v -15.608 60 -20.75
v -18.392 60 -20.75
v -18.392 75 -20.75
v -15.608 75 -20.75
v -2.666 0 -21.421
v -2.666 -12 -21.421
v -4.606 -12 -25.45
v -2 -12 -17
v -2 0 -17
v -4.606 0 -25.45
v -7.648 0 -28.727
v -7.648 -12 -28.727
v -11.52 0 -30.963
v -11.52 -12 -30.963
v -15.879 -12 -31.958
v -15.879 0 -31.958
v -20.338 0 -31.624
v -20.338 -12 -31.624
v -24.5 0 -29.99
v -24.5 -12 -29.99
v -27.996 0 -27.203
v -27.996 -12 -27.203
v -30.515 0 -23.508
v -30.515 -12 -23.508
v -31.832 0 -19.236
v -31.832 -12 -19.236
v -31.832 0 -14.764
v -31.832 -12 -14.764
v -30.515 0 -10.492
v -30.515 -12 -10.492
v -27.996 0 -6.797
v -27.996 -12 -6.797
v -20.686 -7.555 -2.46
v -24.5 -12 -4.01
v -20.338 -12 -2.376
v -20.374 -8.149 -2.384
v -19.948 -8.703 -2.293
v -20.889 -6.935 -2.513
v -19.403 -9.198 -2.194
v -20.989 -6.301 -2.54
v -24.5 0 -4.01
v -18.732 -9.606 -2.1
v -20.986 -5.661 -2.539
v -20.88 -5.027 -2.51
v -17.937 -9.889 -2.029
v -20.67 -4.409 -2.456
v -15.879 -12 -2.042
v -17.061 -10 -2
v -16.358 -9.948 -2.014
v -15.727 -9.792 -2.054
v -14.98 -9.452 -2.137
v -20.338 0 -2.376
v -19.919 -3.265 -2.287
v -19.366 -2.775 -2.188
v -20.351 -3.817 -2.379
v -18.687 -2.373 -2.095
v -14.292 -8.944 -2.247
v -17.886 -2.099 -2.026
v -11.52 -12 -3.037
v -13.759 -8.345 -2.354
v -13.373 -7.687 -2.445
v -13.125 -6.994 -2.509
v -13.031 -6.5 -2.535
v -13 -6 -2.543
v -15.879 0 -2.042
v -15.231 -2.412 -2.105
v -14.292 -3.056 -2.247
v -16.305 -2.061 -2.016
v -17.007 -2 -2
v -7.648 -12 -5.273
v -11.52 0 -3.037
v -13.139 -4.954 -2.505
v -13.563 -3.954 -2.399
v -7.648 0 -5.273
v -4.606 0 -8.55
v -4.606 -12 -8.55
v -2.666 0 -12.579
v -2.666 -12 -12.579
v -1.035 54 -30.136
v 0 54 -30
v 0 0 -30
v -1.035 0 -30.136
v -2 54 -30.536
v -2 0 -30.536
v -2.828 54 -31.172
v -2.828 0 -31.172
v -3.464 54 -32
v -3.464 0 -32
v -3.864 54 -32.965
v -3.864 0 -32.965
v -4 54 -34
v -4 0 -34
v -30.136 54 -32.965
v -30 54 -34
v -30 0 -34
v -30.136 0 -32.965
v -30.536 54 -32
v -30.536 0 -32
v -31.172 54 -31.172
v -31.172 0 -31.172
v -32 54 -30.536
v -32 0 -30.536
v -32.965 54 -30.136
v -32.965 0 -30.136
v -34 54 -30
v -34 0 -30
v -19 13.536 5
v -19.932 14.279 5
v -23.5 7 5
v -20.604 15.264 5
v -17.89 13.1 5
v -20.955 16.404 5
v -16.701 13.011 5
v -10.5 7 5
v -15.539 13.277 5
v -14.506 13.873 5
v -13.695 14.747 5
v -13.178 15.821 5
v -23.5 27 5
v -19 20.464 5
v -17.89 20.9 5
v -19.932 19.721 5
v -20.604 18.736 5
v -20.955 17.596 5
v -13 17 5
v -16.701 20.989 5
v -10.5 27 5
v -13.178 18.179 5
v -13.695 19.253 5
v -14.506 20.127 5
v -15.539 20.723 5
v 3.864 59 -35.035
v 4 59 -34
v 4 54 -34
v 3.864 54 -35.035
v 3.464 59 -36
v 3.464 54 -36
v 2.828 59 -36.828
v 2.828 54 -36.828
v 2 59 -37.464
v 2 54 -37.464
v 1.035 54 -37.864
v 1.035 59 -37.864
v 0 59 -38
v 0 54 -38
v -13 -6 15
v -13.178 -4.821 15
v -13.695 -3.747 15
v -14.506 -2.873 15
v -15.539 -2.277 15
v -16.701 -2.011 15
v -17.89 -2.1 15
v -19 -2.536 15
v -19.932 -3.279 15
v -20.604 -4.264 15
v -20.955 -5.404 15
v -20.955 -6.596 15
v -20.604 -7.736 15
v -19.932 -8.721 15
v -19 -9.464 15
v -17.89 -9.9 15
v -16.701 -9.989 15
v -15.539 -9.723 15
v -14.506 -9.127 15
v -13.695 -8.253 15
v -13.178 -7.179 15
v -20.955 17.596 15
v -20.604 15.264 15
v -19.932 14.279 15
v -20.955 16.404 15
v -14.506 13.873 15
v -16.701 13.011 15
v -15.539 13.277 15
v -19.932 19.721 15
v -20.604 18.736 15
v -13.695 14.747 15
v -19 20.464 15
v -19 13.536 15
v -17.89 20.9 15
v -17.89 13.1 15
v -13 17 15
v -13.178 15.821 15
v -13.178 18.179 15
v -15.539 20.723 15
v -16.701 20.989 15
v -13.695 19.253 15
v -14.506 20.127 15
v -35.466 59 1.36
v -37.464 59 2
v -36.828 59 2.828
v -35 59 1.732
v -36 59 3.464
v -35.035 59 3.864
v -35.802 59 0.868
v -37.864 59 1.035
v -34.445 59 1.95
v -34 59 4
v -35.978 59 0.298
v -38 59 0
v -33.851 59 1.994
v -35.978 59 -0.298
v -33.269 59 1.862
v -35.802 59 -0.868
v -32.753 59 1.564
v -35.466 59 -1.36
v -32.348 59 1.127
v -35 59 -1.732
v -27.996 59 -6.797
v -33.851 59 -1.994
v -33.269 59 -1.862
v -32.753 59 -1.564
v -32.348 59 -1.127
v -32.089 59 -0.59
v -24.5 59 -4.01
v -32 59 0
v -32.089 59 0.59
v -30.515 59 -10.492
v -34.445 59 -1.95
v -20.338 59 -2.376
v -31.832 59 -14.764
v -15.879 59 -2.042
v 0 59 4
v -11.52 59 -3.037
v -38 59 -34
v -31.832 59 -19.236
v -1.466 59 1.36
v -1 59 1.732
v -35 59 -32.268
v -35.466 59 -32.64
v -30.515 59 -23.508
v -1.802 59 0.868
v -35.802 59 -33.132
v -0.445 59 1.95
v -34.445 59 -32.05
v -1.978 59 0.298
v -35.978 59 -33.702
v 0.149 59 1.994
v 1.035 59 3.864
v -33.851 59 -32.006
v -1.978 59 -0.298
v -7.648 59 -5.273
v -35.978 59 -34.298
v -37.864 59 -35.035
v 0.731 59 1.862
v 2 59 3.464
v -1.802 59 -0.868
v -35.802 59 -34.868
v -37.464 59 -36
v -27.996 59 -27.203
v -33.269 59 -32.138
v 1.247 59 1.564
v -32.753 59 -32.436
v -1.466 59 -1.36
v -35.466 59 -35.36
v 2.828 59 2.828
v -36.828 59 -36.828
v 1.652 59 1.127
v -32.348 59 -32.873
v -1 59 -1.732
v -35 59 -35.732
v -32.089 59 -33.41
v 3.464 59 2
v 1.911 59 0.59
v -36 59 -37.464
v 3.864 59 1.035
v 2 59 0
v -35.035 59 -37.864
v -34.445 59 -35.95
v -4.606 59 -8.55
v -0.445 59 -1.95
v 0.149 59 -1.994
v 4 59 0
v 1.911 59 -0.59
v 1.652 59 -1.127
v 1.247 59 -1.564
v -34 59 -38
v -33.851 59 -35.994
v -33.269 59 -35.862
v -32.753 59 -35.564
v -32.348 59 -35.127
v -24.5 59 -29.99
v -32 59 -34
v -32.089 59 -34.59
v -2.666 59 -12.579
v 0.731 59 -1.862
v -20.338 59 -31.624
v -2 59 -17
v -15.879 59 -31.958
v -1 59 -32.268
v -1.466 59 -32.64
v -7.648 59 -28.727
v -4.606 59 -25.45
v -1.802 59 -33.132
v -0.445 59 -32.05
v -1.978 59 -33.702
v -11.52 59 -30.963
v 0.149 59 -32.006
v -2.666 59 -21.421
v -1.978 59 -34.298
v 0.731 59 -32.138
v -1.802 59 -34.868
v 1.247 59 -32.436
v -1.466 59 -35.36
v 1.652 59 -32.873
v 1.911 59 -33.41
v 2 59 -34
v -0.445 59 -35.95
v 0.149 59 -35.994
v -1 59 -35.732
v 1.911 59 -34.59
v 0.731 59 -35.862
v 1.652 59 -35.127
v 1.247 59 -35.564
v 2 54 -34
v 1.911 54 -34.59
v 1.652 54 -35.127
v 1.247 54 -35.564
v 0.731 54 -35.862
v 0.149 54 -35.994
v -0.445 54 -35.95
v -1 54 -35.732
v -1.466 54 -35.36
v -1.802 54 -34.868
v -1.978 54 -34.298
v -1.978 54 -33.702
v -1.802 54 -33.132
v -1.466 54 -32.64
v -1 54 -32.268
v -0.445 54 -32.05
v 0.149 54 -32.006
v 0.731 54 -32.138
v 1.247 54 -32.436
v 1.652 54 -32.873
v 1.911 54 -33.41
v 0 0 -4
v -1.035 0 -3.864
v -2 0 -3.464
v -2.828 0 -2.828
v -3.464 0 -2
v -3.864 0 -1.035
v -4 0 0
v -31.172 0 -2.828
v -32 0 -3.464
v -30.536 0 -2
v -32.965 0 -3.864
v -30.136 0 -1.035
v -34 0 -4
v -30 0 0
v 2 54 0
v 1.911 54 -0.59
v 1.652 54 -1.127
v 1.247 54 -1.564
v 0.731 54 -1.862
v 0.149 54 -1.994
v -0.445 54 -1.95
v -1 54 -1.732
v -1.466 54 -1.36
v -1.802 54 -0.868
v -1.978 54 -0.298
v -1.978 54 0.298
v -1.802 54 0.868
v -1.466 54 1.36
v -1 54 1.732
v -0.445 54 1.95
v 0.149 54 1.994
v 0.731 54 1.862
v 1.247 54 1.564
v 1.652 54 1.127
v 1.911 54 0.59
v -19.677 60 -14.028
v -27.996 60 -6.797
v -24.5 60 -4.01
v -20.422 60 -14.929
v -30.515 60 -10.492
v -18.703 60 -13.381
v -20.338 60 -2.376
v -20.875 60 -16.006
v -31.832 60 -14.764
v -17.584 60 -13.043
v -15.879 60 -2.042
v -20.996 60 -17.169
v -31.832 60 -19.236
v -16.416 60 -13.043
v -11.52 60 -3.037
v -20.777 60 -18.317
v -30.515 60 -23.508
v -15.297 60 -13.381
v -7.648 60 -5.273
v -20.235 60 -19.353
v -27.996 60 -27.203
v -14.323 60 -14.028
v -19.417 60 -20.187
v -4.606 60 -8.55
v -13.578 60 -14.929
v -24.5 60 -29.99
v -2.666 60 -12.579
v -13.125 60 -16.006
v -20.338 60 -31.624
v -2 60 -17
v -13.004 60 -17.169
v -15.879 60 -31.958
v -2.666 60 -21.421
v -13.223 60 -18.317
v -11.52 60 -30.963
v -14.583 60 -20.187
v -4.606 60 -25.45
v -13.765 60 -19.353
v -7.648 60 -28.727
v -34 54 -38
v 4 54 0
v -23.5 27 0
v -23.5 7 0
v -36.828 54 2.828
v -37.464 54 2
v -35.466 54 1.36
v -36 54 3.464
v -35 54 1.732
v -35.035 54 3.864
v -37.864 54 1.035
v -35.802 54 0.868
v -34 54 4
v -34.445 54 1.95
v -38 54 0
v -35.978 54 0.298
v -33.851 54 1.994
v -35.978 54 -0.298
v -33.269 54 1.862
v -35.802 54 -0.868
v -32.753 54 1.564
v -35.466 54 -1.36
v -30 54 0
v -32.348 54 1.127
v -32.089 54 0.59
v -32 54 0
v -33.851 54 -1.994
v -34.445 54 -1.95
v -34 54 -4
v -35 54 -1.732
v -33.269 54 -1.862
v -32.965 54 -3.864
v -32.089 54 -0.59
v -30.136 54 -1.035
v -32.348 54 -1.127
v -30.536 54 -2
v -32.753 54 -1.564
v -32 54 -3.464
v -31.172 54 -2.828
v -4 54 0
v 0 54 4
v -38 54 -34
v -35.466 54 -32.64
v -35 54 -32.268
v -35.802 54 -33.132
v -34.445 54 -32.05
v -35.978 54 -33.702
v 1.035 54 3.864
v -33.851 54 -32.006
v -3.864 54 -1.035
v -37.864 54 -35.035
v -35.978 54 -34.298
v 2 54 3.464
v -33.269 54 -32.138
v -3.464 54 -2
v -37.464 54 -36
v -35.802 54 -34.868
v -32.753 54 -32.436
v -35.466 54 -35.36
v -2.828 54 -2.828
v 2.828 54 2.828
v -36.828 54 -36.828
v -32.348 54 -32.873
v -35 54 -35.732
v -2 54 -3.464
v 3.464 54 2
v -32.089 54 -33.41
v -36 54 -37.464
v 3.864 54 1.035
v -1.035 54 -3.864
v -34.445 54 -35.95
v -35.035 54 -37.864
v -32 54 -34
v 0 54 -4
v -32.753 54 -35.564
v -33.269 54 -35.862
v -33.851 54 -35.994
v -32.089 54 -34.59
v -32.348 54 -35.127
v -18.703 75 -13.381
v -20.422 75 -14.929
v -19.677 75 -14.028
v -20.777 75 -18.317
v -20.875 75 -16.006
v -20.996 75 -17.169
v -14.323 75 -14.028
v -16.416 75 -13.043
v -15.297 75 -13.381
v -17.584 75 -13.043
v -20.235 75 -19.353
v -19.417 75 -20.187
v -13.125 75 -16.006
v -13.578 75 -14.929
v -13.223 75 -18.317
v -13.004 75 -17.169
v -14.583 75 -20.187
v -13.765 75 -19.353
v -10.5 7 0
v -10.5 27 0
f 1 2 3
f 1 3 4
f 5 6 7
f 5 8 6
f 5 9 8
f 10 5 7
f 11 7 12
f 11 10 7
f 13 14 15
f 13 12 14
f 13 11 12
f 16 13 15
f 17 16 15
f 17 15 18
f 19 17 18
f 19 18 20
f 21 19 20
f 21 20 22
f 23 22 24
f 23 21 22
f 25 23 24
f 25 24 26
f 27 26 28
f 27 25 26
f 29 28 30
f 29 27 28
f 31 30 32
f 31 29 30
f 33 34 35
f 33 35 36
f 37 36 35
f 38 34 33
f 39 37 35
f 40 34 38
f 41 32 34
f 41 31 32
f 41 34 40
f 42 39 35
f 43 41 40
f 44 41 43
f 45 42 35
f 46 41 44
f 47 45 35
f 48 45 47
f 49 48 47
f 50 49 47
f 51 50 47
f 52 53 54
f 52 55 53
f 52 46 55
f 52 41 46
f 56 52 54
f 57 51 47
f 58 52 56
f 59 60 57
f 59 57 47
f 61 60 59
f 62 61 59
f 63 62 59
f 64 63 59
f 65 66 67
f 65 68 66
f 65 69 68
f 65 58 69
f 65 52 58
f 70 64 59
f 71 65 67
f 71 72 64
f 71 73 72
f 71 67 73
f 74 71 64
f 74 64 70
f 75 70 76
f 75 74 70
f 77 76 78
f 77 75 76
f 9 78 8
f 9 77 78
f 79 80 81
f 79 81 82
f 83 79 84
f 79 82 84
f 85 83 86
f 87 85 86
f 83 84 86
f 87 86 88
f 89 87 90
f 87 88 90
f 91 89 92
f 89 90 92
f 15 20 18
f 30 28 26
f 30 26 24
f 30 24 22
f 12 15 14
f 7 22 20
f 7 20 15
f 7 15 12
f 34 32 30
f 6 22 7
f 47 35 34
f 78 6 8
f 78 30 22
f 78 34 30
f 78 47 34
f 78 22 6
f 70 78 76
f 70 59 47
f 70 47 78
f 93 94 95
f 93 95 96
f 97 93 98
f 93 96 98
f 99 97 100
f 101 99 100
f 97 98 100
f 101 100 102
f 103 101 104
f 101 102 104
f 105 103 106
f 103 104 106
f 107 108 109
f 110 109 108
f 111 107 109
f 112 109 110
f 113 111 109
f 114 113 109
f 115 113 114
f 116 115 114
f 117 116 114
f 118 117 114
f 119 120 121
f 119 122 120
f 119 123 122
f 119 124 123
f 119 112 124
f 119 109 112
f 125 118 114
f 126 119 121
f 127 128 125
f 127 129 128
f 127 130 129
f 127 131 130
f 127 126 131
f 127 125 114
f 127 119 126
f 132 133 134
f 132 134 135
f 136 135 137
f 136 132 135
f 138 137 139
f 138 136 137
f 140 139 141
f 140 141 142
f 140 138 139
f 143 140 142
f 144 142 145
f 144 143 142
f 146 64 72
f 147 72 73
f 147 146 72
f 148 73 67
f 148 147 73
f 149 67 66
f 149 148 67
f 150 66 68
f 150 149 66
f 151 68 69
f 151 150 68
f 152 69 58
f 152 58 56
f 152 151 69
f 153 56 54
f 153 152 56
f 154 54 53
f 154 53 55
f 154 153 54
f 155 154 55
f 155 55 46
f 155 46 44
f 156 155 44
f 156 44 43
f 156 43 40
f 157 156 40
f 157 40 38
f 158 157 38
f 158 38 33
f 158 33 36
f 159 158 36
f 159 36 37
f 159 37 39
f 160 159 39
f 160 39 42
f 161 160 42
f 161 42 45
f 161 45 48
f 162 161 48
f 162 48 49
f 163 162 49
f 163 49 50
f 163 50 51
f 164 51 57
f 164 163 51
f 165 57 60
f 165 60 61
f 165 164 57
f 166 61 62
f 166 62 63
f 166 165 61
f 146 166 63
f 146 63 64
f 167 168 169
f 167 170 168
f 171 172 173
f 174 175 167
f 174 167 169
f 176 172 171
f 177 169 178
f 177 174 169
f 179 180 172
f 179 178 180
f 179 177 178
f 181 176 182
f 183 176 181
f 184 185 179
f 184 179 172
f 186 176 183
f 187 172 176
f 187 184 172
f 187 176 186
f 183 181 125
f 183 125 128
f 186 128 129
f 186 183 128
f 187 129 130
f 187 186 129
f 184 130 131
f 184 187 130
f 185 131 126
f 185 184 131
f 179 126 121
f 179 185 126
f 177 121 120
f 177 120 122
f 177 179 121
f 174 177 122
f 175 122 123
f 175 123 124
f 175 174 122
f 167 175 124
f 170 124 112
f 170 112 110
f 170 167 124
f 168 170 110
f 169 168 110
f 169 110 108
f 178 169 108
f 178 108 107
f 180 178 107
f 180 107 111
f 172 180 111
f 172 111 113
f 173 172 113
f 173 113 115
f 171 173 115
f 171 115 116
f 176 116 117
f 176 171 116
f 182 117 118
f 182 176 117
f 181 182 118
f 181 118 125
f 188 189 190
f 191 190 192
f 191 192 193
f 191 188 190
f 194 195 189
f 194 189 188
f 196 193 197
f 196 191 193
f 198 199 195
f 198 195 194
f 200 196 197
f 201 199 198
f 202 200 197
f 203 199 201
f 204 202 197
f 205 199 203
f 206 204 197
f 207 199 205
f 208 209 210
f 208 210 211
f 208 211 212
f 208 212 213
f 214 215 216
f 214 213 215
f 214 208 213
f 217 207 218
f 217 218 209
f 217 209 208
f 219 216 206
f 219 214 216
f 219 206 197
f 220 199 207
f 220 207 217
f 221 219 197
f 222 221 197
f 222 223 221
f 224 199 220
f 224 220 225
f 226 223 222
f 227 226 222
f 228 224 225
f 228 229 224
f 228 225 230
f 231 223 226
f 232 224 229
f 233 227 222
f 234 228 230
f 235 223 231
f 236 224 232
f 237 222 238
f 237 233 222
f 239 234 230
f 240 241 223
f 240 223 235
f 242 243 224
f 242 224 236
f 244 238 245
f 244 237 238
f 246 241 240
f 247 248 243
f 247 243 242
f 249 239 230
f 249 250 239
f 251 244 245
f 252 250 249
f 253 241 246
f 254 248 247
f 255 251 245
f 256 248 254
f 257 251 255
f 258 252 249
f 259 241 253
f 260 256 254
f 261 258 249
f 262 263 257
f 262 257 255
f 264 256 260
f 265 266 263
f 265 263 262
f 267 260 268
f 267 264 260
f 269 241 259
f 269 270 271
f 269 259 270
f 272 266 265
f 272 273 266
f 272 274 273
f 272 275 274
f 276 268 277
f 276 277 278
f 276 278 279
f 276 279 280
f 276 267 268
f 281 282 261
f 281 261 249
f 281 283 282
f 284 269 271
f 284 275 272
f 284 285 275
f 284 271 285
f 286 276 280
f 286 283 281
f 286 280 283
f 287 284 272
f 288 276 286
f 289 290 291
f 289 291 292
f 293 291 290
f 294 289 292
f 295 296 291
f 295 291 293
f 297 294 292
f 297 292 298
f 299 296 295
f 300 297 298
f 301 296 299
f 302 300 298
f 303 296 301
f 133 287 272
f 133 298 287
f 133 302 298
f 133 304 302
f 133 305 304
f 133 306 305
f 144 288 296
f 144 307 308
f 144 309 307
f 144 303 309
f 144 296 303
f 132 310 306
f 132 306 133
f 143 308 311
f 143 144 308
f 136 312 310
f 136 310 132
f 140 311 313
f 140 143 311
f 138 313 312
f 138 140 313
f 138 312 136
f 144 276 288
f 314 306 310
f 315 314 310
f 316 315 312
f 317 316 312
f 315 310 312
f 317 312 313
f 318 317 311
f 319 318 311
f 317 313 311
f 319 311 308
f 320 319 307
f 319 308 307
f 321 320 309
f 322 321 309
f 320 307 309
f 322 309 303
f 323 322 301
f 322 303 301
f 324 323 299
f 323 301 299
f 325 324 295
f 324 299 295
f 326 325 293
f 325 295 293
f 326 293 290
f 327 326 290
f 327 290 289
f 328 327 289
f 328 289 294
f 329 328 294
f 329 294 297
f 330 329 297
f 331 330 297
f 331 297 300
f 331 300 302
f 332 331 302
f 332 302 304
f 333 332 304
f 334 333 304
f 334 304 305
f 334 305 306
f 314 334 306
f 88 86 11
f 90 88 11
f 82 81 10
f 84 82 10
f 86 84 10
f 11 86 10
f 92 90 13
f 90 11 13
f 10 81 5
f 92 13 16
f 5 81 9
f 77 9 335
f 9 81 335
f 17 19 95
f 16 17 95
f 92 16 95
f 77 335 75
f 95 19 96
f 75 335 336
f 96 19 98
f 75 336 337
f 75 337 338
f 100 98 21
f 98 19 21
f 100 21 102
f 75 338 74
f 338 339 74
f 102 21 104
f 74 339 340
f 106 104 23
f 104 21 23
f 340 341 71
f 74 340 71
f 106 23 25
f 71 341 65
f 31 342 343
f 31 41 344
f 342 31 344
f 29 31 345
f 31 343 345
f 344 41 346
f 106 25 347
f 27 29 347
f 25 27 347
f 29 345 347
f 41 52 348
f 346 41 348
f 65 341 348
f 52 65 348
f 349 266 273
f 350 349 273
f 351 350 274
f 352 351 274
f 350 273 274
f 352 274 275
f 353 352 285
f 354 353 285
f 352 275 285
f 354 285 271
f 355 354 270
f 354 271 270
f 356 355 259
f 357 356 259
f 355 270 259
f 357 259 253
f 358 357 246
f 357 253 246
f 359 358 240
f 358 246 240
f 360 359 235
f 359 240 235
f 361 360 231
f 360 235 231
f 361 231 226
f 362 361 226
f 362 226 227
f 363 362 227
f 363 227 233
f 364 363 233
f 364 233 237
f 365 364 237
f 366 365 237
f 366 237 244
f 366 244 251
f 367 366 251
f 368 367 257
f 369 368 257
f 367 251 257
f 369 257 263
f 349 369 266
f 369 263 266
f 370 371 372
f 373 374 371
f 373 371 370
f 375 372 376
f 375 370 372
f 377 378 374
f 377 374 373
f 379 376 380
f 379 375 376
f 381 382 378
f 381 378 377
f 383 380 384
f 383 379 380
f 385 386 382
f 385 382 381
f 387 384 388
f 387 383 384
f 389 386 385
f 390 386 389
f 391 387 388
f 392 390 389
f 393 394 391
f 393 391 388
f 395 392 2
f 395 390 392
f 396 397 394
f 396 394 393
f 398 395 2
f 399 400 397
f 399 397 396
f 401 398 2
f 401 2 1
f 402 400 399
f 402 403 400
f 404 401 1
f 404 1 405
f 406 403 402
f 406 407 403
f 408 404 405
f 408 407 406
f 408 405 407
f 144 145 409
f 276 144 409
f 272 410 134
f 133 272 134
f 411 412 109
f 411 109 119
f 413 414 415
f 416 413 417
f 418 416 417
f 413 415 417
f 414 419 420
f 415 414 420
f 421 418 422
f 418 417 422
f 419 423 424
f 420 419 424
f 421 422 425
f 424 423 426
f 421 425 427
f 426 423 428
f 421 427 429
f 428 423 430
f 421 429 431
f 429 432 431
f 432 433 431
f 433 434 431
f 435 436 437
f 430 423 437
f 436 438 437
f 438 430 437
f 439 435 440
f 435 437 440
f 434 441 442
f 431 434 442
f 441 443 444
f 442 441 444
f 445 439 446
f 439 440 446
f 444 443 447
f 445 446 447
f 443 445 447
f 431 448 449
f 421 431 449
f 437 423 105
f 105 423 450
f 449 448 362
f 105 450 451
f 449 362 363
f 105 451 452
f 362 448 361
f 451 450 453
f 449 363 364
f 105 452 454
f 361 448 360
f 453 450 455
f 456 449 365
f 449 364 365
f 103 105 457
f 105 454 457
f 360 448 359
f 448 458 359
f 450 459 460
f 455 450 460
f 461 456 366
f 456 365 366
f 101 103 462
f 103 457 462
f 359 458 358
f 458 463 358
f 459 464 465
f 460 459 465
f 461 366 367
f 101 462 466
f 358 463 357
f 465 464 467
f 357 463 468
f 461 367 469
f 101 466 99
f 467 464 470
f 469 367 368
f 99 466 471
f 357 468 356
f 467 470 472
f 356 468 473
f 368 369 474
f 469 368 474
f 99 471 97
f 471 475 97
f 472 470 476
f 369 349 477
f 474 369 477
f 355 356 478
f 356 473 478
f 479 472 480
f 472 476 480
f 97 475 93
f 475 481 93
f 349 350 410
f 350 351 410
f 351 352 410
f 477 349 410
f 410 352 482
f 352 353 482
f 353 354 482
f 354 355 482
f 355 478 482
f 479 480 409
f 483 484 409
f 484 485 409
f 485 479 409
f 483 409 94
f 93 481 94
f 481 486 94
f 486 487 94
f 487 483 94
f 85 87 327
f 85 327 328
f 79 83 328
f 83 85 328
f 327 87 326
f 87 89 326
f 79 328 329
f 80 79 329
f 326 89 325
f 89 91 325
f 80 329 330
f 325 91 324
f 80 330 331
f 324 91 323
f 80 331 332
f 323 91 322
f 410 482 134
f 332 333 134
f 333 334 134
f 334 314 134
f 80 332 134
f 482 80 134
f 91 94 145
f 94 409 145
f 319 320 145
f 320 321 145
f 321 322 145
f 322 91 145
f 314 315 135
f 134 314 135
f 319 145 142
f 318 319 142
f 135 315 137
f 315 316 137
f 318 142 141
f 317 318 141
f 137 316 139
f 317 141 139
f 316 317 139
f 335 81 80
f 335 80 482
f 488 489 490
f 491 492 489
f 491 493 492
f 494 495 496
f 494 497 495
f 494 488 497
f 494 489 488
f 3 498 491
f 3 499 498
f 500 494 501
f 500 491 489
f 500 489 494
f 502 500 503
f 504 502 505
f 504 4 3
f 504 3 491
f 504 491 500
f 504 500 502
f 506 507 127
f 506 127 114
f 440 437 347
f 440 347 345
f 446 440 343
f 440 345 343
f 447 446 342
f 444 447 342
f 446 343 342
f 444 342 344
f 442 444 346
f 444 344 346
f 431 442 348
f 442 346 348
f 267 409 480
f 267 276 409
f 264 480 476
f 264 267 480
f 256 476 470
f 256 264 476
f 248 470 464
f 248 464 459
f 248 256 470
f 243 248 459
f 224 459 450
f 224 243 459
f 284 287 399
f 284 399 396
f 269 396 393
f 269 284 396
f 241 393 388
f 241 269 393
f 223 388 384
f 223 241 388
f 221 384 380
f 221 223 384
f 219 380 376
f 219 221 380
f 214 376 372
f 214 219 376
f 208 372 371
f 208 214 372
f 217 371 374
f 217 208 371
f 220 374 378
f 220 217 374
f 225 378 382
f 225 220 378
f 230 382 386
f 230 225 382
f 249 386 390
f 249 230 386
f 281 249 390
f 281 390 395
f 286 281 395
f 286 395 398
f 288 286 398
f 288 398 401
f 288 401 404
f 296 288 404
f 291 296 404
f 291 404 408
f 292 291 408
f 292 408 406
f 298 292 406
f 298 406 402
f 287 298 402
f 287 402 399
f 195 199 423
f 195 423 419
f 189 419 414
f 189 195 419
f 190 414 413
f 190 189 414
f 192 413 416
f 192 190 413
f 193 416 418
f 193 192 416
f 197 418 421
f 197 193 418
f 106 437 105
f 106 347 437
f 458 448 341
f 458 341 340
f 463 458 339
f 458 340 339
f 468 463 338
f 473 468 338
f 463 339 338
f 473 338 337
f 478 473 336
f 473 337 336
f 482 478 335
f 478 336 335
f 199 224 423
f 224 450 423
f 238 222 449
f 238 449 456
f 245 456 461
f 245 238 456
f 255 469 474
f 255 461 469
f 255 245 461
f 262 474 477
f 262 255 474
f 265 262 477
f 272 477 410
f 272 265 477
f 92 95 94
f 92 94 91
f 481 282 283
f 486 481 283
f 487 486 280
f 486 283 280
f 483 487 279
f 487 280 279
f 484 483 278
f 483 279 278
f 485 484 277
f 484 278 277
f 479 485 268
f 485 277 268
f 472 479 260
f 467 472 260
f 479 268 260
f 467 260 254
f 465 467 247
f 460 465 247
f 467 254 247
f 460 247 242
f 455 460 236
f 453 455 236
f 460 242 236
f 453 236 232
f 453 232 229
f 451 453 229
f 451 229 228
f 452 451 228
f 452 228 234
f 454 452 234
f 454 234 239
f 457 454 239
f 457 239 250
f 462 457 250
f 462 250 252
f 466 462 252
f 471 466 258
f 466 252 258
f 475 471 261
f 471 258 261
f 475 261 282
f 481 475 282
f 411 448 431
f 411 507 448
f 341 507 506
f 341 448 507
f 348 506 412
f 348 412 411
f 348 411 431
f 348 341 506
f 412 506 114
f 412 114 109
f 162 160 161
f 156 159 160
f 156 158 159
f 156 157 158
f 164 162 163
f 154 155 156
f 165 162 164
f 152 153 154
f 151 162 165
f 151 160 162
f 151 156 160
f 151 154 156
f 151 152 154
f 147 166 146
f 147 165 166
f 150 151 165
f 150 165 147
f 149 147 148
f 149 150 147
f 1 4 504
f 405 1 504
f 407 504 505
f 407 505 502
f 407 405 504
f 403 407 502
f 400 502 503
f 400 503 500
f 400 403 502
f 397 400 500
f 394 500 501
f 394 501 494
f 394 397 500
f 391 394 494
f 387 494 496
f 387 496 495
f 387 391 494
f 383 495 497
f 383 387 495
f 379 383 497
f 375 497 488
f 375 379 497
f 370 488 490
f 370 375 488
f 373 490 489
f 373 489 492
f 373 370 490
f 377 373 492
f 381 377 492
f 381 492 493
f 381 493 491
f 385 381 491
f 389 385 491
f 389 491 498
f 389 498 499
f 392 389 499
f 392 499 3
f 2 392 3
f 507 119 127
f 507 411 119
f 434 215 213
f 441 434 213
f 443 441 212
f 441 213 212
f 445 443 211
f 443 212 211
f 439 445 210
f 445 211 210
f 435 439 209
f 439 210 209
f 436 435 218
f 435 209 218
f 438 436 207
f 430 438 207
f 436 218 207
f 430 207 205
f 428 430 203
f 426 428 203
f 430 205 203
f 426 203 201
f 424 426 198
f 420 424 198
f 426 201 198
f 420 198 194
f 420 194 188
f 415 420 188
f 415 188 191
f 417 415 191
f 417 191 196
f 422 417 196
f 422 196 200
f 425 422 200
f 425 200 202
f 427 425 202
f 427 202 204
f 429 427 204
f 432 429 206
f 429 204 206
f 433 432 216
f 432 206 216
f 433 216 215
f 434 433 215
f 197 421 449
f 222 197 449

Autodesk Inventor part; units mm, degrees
ref_plane "YZ Plane" through (0, 0, 0) normal (1, 0, 0) x (0, 1, 0)
ref_plane "XZ Plane" through (0, 0, 0) normal (0, 1, 0) x (-1, 0, 0)
sketch "Sketch1" plane through (0, 0, 0) normal (0, 1, 0) x (-1, 0, 0)
  line L0 (0, 0) -> (34, 0)
  line L1 (34, 0) -> (34, -34)
  line L2 (34, -34) -> (0, -34)
  line L3 (0, -34) -> (0, 0)
  dimension "d0" = 34
  dimension "d1" = 34
extrude "Extrusion1" add sketch "Sketch1" along normal blind 54
sketch "Sketch4" plane through (0, 54, 0) normal (0, 1, 0) x (1, 0, 0)
  point P0 (0, 0)
sketch "Sketch5" plane through (0, 54, 0) normal (0, 1, 0) x (1, 0, 0)
  line L0 (-34, 34) -> (-34, 0) projected
  line L1 (0, 0) -> (-34, 0)
  line L2 (-34, 0) -> (-34, 34)
  line L3 (-34, 34) -> (0, 34)
  line L4 (0, 34) -> (0, 0)
  line L5 (4, 38) -> (-38, 38)
  line L6 (-38, 38) -> (-38, -4)
  line L7 (-38, -4) -> (4, -4)
  line L8 (4, -4) -> (4, 38)
  dimension "d15" = 4
extrude "Extrusion2" add sketch "Sketch5" along normal blind 5 contours L3 L4 L1 L0 | L8 L7 L6 L5
sketch "Sketch6" plane through (0, 59, 0) normal (0, 1, 0) x (1, 0, 0)
  line L0 (-34, 34) -> (-34, 0) projected
  circle A0 centre (-34, 34) radius 2
  line L1 (-38, 38) -> (-38, -4) projected
  line L2 (-38, 38) -> (-38, 34)
  line L3 (-38, 38) -> (-34, 38)
  line L4 (4, 38) -> (-38, 38) projected
  circle A1 centre (-34, 0) radius 2
  circle A2 centre (0, 34) radius 2
  circle A3 centre (0, 0) radius 2
  point P0 (0, 0)
  dimension "d18" = 4
  dimension "d21" = 34
  dimension "d24" = 34
extrude "Extrusion3" cut sketch "Sketch6" against normal blind 5
sketch "Sketch8" plane through (0, 0, 0) normal (0, -1, 0) x (1, 0, 0)
  line L0 (0, -32) -> (0, -34) projected
  line L1 (0, -2) -> (0, -32) projected
  arc A0 (0, -30) -> (-4, -34) centre (0, -34) ccw
  line L2 (-32, -34) -> (-34, -34) projected
  line L3 (-34, -32) -> (-34, -2) projected
  line L4 (-34, -34) -> (-30, -34) construction
  line L5 (-34, -34) -> (-30, -34) construction
  line L6 (0, -34) -> (-4, -34)
  line L7 (-2, -34) -> (-32, -34) projected
  line L8 (0, -30) -> (0, -34)
  line L9 (-17, -34) -> (-17, -17)
  circle A1 centre (-17, -17) radius 1.5
  arc A2 (-4, 0) -> (0, -4) centre (0, 0) ccw
  line L10 (0, 0) -> (0, -4)
  line L11 (-4, 0) -> (0, 0)
  arc A3 (-34, -4) -> (-30, 0) centre (-34, 0) ccw
  line L12 (-34, 0) -> (-30, 0)
  line L13 (-34, -4) -> (-34, 0)
  arc A4 (-30, -34) -> (-34, -30) centre (-34, -34) ccw
  line L14 (-34, -34) -> (-34, -30)
  line L15 (-30, -34) -> (-34, -34)
  point P0 (0, 0)
  point P1 (0, -2)
  point P2 (-2, 0)
  point P3 (-32, 0)
  point P4 (-34, -2)
  point P5 (-34, -32)
  point P6 (-32, -34)
  dimension "d29" = 4
  dimension "d31" = 0
  dimension "d32" = 3
  dimension "d33" = 17
  dimension "d36" = 360
extrude "Extrusion4" cut sketch "Sketch8" against normal up to surface (54 mm away) contours L3 L13 L12 A3 | L7 L2 L14 L3 A4 | A2 L11 L10 L1 | L0 L6 A0 L1
sketch "Sketch9" plane through (0, 59, 0) normal (0, 1, 0) x (1, 0, 0)
  line L0 (-38, -4) -> (4, -4) projected
  line L1 (-17, -4) -> (-17, 17)
  circle A0 centre (-17, 17) radius 15
  point P0 (0, 0)
  dimension "d40" = 21
  dimension "d41" = 30
extrude "Extrusion5" add sketch "Sketch9" along normal blind 1
sketch "Sketch10" plane through (-17, 60, -17) normal (0, 1, 0) x (1, 0, 0)
  circle A0 centre (0, 0) radius 15 projected
  circle A1 centre (0, 0) radius 4
  line L0 (0, 0) -> (0, 3.75)
  line L1 (0, 3.75) -> (1.3919, 3.75)
  line L2 (0, 3.75) -> (-1.3919, 3.75)
  point P0 (17, -17)
  dimension "d44" = 8
  dimension "d45" = 3.75
extrude "Extrusion6" add sketch "Sketch10" along normal blind 15 contours A1 L2 L1 picked at (-0.0068, -1.3972)
fillet "Fillet1" radius 4 4 edges at (4, 56.5, -38) (4, 56.5, 4) (-38, 56.5, -38) (-38, 56.5, 4)
sketch "Sketch11" plane through (-30, 0, 0) normal (0, 0, 1) x (1, 0, 0)
  line L0 (26, 0) -> (0, 0) projected
  line L1 (13, 0) -> (13, 17)
  line L2 (6.5, 27) -> (19.5, 27)
  line L3 (19.5, 27) -> (19.5, 7)
  line L4 (19.5, 7) -> (6.5, 7)
  line L5 (6.5, 7) -> (6.5, 27)
  line L6 (6.5, 27) -> (19.5, 7) construction
  line L7 (19.5, 27) -> (6.5, 7) construction
  point P0 (30, 0)
  dimension "d49" = 17
  dimension "d50" = 13
  dimension "d51" = 20
extrude "Extrusion7" add sketch "Sketch11" along normal blind 5
ref_plane "Work Plane1" through (-30, 0, 20) normal (0, 0, 1) x (1, 0, 0)
sketch "Sketch12" plane through (-30, 0, 20) normal (0, 0, 1) x (1, 0, 0)
  line L0 (6.5, 7) -> (6.5, 27) projected
  line L1 (6.5, 7) -> (6.5, 0)
  line L2 (26, 0) -> (0, 0) projected
  circle A0 centre (6.5, 0) radius 4
  line L3 (19.5, 7) -> (6.5, 7) projected
  line L4 (19.5, 7) -> (19.5, 0)
  circle A1 centre (19.5, 0) radius 4
  point P0 (30, 0)
  dimension "d61" = 8
  dimension "d62" = 8
sketch "Sketch13" plane through (0, 0, 0) normal (0, -1, 0) x (1, 0, 0)
  line L0 (0, -30) -> (0, -4) projected
  line L1 (0, -17) -> (-17, -17)
  circle A0 centre (-17, -17) radius 15
  point P0 (0, 0)
  dimension "d57" = 17
  dimension "d58" = 30
extrude "Extrusion8" add sketch "Sketch13" along normal blind 12
sketch "Sketch14" plane through (-23.5, 7, 0) normal (0, -1, 0) x (1, 0, 0)
  point P0 (23.5, 0)
sketch "Sketch15" plane through (-30, 0, 5) normal (0, 0, 1) x (1, 0, 0)
  line L0 (6.5, 7) -> (6.5, 27) projected
  line L1 (6.5, 17) -> (13, 17)
  circle A0 centre (13, 17) radius 4
  line L2 (13, 17) -> (13, -6)
  circle A1 centre (13, -6) radius 4
  point P0 (30, 0)
  dimension "d63" = 6.5
  dimension "d64" = 8
  dimension "d65" = 23
  dimension "d66" = 8
extrude "Extrusion9" add sketch "Sketch15" along normal mid plane 20
properties part number "NEMA17_Stepper_CL42H60"
